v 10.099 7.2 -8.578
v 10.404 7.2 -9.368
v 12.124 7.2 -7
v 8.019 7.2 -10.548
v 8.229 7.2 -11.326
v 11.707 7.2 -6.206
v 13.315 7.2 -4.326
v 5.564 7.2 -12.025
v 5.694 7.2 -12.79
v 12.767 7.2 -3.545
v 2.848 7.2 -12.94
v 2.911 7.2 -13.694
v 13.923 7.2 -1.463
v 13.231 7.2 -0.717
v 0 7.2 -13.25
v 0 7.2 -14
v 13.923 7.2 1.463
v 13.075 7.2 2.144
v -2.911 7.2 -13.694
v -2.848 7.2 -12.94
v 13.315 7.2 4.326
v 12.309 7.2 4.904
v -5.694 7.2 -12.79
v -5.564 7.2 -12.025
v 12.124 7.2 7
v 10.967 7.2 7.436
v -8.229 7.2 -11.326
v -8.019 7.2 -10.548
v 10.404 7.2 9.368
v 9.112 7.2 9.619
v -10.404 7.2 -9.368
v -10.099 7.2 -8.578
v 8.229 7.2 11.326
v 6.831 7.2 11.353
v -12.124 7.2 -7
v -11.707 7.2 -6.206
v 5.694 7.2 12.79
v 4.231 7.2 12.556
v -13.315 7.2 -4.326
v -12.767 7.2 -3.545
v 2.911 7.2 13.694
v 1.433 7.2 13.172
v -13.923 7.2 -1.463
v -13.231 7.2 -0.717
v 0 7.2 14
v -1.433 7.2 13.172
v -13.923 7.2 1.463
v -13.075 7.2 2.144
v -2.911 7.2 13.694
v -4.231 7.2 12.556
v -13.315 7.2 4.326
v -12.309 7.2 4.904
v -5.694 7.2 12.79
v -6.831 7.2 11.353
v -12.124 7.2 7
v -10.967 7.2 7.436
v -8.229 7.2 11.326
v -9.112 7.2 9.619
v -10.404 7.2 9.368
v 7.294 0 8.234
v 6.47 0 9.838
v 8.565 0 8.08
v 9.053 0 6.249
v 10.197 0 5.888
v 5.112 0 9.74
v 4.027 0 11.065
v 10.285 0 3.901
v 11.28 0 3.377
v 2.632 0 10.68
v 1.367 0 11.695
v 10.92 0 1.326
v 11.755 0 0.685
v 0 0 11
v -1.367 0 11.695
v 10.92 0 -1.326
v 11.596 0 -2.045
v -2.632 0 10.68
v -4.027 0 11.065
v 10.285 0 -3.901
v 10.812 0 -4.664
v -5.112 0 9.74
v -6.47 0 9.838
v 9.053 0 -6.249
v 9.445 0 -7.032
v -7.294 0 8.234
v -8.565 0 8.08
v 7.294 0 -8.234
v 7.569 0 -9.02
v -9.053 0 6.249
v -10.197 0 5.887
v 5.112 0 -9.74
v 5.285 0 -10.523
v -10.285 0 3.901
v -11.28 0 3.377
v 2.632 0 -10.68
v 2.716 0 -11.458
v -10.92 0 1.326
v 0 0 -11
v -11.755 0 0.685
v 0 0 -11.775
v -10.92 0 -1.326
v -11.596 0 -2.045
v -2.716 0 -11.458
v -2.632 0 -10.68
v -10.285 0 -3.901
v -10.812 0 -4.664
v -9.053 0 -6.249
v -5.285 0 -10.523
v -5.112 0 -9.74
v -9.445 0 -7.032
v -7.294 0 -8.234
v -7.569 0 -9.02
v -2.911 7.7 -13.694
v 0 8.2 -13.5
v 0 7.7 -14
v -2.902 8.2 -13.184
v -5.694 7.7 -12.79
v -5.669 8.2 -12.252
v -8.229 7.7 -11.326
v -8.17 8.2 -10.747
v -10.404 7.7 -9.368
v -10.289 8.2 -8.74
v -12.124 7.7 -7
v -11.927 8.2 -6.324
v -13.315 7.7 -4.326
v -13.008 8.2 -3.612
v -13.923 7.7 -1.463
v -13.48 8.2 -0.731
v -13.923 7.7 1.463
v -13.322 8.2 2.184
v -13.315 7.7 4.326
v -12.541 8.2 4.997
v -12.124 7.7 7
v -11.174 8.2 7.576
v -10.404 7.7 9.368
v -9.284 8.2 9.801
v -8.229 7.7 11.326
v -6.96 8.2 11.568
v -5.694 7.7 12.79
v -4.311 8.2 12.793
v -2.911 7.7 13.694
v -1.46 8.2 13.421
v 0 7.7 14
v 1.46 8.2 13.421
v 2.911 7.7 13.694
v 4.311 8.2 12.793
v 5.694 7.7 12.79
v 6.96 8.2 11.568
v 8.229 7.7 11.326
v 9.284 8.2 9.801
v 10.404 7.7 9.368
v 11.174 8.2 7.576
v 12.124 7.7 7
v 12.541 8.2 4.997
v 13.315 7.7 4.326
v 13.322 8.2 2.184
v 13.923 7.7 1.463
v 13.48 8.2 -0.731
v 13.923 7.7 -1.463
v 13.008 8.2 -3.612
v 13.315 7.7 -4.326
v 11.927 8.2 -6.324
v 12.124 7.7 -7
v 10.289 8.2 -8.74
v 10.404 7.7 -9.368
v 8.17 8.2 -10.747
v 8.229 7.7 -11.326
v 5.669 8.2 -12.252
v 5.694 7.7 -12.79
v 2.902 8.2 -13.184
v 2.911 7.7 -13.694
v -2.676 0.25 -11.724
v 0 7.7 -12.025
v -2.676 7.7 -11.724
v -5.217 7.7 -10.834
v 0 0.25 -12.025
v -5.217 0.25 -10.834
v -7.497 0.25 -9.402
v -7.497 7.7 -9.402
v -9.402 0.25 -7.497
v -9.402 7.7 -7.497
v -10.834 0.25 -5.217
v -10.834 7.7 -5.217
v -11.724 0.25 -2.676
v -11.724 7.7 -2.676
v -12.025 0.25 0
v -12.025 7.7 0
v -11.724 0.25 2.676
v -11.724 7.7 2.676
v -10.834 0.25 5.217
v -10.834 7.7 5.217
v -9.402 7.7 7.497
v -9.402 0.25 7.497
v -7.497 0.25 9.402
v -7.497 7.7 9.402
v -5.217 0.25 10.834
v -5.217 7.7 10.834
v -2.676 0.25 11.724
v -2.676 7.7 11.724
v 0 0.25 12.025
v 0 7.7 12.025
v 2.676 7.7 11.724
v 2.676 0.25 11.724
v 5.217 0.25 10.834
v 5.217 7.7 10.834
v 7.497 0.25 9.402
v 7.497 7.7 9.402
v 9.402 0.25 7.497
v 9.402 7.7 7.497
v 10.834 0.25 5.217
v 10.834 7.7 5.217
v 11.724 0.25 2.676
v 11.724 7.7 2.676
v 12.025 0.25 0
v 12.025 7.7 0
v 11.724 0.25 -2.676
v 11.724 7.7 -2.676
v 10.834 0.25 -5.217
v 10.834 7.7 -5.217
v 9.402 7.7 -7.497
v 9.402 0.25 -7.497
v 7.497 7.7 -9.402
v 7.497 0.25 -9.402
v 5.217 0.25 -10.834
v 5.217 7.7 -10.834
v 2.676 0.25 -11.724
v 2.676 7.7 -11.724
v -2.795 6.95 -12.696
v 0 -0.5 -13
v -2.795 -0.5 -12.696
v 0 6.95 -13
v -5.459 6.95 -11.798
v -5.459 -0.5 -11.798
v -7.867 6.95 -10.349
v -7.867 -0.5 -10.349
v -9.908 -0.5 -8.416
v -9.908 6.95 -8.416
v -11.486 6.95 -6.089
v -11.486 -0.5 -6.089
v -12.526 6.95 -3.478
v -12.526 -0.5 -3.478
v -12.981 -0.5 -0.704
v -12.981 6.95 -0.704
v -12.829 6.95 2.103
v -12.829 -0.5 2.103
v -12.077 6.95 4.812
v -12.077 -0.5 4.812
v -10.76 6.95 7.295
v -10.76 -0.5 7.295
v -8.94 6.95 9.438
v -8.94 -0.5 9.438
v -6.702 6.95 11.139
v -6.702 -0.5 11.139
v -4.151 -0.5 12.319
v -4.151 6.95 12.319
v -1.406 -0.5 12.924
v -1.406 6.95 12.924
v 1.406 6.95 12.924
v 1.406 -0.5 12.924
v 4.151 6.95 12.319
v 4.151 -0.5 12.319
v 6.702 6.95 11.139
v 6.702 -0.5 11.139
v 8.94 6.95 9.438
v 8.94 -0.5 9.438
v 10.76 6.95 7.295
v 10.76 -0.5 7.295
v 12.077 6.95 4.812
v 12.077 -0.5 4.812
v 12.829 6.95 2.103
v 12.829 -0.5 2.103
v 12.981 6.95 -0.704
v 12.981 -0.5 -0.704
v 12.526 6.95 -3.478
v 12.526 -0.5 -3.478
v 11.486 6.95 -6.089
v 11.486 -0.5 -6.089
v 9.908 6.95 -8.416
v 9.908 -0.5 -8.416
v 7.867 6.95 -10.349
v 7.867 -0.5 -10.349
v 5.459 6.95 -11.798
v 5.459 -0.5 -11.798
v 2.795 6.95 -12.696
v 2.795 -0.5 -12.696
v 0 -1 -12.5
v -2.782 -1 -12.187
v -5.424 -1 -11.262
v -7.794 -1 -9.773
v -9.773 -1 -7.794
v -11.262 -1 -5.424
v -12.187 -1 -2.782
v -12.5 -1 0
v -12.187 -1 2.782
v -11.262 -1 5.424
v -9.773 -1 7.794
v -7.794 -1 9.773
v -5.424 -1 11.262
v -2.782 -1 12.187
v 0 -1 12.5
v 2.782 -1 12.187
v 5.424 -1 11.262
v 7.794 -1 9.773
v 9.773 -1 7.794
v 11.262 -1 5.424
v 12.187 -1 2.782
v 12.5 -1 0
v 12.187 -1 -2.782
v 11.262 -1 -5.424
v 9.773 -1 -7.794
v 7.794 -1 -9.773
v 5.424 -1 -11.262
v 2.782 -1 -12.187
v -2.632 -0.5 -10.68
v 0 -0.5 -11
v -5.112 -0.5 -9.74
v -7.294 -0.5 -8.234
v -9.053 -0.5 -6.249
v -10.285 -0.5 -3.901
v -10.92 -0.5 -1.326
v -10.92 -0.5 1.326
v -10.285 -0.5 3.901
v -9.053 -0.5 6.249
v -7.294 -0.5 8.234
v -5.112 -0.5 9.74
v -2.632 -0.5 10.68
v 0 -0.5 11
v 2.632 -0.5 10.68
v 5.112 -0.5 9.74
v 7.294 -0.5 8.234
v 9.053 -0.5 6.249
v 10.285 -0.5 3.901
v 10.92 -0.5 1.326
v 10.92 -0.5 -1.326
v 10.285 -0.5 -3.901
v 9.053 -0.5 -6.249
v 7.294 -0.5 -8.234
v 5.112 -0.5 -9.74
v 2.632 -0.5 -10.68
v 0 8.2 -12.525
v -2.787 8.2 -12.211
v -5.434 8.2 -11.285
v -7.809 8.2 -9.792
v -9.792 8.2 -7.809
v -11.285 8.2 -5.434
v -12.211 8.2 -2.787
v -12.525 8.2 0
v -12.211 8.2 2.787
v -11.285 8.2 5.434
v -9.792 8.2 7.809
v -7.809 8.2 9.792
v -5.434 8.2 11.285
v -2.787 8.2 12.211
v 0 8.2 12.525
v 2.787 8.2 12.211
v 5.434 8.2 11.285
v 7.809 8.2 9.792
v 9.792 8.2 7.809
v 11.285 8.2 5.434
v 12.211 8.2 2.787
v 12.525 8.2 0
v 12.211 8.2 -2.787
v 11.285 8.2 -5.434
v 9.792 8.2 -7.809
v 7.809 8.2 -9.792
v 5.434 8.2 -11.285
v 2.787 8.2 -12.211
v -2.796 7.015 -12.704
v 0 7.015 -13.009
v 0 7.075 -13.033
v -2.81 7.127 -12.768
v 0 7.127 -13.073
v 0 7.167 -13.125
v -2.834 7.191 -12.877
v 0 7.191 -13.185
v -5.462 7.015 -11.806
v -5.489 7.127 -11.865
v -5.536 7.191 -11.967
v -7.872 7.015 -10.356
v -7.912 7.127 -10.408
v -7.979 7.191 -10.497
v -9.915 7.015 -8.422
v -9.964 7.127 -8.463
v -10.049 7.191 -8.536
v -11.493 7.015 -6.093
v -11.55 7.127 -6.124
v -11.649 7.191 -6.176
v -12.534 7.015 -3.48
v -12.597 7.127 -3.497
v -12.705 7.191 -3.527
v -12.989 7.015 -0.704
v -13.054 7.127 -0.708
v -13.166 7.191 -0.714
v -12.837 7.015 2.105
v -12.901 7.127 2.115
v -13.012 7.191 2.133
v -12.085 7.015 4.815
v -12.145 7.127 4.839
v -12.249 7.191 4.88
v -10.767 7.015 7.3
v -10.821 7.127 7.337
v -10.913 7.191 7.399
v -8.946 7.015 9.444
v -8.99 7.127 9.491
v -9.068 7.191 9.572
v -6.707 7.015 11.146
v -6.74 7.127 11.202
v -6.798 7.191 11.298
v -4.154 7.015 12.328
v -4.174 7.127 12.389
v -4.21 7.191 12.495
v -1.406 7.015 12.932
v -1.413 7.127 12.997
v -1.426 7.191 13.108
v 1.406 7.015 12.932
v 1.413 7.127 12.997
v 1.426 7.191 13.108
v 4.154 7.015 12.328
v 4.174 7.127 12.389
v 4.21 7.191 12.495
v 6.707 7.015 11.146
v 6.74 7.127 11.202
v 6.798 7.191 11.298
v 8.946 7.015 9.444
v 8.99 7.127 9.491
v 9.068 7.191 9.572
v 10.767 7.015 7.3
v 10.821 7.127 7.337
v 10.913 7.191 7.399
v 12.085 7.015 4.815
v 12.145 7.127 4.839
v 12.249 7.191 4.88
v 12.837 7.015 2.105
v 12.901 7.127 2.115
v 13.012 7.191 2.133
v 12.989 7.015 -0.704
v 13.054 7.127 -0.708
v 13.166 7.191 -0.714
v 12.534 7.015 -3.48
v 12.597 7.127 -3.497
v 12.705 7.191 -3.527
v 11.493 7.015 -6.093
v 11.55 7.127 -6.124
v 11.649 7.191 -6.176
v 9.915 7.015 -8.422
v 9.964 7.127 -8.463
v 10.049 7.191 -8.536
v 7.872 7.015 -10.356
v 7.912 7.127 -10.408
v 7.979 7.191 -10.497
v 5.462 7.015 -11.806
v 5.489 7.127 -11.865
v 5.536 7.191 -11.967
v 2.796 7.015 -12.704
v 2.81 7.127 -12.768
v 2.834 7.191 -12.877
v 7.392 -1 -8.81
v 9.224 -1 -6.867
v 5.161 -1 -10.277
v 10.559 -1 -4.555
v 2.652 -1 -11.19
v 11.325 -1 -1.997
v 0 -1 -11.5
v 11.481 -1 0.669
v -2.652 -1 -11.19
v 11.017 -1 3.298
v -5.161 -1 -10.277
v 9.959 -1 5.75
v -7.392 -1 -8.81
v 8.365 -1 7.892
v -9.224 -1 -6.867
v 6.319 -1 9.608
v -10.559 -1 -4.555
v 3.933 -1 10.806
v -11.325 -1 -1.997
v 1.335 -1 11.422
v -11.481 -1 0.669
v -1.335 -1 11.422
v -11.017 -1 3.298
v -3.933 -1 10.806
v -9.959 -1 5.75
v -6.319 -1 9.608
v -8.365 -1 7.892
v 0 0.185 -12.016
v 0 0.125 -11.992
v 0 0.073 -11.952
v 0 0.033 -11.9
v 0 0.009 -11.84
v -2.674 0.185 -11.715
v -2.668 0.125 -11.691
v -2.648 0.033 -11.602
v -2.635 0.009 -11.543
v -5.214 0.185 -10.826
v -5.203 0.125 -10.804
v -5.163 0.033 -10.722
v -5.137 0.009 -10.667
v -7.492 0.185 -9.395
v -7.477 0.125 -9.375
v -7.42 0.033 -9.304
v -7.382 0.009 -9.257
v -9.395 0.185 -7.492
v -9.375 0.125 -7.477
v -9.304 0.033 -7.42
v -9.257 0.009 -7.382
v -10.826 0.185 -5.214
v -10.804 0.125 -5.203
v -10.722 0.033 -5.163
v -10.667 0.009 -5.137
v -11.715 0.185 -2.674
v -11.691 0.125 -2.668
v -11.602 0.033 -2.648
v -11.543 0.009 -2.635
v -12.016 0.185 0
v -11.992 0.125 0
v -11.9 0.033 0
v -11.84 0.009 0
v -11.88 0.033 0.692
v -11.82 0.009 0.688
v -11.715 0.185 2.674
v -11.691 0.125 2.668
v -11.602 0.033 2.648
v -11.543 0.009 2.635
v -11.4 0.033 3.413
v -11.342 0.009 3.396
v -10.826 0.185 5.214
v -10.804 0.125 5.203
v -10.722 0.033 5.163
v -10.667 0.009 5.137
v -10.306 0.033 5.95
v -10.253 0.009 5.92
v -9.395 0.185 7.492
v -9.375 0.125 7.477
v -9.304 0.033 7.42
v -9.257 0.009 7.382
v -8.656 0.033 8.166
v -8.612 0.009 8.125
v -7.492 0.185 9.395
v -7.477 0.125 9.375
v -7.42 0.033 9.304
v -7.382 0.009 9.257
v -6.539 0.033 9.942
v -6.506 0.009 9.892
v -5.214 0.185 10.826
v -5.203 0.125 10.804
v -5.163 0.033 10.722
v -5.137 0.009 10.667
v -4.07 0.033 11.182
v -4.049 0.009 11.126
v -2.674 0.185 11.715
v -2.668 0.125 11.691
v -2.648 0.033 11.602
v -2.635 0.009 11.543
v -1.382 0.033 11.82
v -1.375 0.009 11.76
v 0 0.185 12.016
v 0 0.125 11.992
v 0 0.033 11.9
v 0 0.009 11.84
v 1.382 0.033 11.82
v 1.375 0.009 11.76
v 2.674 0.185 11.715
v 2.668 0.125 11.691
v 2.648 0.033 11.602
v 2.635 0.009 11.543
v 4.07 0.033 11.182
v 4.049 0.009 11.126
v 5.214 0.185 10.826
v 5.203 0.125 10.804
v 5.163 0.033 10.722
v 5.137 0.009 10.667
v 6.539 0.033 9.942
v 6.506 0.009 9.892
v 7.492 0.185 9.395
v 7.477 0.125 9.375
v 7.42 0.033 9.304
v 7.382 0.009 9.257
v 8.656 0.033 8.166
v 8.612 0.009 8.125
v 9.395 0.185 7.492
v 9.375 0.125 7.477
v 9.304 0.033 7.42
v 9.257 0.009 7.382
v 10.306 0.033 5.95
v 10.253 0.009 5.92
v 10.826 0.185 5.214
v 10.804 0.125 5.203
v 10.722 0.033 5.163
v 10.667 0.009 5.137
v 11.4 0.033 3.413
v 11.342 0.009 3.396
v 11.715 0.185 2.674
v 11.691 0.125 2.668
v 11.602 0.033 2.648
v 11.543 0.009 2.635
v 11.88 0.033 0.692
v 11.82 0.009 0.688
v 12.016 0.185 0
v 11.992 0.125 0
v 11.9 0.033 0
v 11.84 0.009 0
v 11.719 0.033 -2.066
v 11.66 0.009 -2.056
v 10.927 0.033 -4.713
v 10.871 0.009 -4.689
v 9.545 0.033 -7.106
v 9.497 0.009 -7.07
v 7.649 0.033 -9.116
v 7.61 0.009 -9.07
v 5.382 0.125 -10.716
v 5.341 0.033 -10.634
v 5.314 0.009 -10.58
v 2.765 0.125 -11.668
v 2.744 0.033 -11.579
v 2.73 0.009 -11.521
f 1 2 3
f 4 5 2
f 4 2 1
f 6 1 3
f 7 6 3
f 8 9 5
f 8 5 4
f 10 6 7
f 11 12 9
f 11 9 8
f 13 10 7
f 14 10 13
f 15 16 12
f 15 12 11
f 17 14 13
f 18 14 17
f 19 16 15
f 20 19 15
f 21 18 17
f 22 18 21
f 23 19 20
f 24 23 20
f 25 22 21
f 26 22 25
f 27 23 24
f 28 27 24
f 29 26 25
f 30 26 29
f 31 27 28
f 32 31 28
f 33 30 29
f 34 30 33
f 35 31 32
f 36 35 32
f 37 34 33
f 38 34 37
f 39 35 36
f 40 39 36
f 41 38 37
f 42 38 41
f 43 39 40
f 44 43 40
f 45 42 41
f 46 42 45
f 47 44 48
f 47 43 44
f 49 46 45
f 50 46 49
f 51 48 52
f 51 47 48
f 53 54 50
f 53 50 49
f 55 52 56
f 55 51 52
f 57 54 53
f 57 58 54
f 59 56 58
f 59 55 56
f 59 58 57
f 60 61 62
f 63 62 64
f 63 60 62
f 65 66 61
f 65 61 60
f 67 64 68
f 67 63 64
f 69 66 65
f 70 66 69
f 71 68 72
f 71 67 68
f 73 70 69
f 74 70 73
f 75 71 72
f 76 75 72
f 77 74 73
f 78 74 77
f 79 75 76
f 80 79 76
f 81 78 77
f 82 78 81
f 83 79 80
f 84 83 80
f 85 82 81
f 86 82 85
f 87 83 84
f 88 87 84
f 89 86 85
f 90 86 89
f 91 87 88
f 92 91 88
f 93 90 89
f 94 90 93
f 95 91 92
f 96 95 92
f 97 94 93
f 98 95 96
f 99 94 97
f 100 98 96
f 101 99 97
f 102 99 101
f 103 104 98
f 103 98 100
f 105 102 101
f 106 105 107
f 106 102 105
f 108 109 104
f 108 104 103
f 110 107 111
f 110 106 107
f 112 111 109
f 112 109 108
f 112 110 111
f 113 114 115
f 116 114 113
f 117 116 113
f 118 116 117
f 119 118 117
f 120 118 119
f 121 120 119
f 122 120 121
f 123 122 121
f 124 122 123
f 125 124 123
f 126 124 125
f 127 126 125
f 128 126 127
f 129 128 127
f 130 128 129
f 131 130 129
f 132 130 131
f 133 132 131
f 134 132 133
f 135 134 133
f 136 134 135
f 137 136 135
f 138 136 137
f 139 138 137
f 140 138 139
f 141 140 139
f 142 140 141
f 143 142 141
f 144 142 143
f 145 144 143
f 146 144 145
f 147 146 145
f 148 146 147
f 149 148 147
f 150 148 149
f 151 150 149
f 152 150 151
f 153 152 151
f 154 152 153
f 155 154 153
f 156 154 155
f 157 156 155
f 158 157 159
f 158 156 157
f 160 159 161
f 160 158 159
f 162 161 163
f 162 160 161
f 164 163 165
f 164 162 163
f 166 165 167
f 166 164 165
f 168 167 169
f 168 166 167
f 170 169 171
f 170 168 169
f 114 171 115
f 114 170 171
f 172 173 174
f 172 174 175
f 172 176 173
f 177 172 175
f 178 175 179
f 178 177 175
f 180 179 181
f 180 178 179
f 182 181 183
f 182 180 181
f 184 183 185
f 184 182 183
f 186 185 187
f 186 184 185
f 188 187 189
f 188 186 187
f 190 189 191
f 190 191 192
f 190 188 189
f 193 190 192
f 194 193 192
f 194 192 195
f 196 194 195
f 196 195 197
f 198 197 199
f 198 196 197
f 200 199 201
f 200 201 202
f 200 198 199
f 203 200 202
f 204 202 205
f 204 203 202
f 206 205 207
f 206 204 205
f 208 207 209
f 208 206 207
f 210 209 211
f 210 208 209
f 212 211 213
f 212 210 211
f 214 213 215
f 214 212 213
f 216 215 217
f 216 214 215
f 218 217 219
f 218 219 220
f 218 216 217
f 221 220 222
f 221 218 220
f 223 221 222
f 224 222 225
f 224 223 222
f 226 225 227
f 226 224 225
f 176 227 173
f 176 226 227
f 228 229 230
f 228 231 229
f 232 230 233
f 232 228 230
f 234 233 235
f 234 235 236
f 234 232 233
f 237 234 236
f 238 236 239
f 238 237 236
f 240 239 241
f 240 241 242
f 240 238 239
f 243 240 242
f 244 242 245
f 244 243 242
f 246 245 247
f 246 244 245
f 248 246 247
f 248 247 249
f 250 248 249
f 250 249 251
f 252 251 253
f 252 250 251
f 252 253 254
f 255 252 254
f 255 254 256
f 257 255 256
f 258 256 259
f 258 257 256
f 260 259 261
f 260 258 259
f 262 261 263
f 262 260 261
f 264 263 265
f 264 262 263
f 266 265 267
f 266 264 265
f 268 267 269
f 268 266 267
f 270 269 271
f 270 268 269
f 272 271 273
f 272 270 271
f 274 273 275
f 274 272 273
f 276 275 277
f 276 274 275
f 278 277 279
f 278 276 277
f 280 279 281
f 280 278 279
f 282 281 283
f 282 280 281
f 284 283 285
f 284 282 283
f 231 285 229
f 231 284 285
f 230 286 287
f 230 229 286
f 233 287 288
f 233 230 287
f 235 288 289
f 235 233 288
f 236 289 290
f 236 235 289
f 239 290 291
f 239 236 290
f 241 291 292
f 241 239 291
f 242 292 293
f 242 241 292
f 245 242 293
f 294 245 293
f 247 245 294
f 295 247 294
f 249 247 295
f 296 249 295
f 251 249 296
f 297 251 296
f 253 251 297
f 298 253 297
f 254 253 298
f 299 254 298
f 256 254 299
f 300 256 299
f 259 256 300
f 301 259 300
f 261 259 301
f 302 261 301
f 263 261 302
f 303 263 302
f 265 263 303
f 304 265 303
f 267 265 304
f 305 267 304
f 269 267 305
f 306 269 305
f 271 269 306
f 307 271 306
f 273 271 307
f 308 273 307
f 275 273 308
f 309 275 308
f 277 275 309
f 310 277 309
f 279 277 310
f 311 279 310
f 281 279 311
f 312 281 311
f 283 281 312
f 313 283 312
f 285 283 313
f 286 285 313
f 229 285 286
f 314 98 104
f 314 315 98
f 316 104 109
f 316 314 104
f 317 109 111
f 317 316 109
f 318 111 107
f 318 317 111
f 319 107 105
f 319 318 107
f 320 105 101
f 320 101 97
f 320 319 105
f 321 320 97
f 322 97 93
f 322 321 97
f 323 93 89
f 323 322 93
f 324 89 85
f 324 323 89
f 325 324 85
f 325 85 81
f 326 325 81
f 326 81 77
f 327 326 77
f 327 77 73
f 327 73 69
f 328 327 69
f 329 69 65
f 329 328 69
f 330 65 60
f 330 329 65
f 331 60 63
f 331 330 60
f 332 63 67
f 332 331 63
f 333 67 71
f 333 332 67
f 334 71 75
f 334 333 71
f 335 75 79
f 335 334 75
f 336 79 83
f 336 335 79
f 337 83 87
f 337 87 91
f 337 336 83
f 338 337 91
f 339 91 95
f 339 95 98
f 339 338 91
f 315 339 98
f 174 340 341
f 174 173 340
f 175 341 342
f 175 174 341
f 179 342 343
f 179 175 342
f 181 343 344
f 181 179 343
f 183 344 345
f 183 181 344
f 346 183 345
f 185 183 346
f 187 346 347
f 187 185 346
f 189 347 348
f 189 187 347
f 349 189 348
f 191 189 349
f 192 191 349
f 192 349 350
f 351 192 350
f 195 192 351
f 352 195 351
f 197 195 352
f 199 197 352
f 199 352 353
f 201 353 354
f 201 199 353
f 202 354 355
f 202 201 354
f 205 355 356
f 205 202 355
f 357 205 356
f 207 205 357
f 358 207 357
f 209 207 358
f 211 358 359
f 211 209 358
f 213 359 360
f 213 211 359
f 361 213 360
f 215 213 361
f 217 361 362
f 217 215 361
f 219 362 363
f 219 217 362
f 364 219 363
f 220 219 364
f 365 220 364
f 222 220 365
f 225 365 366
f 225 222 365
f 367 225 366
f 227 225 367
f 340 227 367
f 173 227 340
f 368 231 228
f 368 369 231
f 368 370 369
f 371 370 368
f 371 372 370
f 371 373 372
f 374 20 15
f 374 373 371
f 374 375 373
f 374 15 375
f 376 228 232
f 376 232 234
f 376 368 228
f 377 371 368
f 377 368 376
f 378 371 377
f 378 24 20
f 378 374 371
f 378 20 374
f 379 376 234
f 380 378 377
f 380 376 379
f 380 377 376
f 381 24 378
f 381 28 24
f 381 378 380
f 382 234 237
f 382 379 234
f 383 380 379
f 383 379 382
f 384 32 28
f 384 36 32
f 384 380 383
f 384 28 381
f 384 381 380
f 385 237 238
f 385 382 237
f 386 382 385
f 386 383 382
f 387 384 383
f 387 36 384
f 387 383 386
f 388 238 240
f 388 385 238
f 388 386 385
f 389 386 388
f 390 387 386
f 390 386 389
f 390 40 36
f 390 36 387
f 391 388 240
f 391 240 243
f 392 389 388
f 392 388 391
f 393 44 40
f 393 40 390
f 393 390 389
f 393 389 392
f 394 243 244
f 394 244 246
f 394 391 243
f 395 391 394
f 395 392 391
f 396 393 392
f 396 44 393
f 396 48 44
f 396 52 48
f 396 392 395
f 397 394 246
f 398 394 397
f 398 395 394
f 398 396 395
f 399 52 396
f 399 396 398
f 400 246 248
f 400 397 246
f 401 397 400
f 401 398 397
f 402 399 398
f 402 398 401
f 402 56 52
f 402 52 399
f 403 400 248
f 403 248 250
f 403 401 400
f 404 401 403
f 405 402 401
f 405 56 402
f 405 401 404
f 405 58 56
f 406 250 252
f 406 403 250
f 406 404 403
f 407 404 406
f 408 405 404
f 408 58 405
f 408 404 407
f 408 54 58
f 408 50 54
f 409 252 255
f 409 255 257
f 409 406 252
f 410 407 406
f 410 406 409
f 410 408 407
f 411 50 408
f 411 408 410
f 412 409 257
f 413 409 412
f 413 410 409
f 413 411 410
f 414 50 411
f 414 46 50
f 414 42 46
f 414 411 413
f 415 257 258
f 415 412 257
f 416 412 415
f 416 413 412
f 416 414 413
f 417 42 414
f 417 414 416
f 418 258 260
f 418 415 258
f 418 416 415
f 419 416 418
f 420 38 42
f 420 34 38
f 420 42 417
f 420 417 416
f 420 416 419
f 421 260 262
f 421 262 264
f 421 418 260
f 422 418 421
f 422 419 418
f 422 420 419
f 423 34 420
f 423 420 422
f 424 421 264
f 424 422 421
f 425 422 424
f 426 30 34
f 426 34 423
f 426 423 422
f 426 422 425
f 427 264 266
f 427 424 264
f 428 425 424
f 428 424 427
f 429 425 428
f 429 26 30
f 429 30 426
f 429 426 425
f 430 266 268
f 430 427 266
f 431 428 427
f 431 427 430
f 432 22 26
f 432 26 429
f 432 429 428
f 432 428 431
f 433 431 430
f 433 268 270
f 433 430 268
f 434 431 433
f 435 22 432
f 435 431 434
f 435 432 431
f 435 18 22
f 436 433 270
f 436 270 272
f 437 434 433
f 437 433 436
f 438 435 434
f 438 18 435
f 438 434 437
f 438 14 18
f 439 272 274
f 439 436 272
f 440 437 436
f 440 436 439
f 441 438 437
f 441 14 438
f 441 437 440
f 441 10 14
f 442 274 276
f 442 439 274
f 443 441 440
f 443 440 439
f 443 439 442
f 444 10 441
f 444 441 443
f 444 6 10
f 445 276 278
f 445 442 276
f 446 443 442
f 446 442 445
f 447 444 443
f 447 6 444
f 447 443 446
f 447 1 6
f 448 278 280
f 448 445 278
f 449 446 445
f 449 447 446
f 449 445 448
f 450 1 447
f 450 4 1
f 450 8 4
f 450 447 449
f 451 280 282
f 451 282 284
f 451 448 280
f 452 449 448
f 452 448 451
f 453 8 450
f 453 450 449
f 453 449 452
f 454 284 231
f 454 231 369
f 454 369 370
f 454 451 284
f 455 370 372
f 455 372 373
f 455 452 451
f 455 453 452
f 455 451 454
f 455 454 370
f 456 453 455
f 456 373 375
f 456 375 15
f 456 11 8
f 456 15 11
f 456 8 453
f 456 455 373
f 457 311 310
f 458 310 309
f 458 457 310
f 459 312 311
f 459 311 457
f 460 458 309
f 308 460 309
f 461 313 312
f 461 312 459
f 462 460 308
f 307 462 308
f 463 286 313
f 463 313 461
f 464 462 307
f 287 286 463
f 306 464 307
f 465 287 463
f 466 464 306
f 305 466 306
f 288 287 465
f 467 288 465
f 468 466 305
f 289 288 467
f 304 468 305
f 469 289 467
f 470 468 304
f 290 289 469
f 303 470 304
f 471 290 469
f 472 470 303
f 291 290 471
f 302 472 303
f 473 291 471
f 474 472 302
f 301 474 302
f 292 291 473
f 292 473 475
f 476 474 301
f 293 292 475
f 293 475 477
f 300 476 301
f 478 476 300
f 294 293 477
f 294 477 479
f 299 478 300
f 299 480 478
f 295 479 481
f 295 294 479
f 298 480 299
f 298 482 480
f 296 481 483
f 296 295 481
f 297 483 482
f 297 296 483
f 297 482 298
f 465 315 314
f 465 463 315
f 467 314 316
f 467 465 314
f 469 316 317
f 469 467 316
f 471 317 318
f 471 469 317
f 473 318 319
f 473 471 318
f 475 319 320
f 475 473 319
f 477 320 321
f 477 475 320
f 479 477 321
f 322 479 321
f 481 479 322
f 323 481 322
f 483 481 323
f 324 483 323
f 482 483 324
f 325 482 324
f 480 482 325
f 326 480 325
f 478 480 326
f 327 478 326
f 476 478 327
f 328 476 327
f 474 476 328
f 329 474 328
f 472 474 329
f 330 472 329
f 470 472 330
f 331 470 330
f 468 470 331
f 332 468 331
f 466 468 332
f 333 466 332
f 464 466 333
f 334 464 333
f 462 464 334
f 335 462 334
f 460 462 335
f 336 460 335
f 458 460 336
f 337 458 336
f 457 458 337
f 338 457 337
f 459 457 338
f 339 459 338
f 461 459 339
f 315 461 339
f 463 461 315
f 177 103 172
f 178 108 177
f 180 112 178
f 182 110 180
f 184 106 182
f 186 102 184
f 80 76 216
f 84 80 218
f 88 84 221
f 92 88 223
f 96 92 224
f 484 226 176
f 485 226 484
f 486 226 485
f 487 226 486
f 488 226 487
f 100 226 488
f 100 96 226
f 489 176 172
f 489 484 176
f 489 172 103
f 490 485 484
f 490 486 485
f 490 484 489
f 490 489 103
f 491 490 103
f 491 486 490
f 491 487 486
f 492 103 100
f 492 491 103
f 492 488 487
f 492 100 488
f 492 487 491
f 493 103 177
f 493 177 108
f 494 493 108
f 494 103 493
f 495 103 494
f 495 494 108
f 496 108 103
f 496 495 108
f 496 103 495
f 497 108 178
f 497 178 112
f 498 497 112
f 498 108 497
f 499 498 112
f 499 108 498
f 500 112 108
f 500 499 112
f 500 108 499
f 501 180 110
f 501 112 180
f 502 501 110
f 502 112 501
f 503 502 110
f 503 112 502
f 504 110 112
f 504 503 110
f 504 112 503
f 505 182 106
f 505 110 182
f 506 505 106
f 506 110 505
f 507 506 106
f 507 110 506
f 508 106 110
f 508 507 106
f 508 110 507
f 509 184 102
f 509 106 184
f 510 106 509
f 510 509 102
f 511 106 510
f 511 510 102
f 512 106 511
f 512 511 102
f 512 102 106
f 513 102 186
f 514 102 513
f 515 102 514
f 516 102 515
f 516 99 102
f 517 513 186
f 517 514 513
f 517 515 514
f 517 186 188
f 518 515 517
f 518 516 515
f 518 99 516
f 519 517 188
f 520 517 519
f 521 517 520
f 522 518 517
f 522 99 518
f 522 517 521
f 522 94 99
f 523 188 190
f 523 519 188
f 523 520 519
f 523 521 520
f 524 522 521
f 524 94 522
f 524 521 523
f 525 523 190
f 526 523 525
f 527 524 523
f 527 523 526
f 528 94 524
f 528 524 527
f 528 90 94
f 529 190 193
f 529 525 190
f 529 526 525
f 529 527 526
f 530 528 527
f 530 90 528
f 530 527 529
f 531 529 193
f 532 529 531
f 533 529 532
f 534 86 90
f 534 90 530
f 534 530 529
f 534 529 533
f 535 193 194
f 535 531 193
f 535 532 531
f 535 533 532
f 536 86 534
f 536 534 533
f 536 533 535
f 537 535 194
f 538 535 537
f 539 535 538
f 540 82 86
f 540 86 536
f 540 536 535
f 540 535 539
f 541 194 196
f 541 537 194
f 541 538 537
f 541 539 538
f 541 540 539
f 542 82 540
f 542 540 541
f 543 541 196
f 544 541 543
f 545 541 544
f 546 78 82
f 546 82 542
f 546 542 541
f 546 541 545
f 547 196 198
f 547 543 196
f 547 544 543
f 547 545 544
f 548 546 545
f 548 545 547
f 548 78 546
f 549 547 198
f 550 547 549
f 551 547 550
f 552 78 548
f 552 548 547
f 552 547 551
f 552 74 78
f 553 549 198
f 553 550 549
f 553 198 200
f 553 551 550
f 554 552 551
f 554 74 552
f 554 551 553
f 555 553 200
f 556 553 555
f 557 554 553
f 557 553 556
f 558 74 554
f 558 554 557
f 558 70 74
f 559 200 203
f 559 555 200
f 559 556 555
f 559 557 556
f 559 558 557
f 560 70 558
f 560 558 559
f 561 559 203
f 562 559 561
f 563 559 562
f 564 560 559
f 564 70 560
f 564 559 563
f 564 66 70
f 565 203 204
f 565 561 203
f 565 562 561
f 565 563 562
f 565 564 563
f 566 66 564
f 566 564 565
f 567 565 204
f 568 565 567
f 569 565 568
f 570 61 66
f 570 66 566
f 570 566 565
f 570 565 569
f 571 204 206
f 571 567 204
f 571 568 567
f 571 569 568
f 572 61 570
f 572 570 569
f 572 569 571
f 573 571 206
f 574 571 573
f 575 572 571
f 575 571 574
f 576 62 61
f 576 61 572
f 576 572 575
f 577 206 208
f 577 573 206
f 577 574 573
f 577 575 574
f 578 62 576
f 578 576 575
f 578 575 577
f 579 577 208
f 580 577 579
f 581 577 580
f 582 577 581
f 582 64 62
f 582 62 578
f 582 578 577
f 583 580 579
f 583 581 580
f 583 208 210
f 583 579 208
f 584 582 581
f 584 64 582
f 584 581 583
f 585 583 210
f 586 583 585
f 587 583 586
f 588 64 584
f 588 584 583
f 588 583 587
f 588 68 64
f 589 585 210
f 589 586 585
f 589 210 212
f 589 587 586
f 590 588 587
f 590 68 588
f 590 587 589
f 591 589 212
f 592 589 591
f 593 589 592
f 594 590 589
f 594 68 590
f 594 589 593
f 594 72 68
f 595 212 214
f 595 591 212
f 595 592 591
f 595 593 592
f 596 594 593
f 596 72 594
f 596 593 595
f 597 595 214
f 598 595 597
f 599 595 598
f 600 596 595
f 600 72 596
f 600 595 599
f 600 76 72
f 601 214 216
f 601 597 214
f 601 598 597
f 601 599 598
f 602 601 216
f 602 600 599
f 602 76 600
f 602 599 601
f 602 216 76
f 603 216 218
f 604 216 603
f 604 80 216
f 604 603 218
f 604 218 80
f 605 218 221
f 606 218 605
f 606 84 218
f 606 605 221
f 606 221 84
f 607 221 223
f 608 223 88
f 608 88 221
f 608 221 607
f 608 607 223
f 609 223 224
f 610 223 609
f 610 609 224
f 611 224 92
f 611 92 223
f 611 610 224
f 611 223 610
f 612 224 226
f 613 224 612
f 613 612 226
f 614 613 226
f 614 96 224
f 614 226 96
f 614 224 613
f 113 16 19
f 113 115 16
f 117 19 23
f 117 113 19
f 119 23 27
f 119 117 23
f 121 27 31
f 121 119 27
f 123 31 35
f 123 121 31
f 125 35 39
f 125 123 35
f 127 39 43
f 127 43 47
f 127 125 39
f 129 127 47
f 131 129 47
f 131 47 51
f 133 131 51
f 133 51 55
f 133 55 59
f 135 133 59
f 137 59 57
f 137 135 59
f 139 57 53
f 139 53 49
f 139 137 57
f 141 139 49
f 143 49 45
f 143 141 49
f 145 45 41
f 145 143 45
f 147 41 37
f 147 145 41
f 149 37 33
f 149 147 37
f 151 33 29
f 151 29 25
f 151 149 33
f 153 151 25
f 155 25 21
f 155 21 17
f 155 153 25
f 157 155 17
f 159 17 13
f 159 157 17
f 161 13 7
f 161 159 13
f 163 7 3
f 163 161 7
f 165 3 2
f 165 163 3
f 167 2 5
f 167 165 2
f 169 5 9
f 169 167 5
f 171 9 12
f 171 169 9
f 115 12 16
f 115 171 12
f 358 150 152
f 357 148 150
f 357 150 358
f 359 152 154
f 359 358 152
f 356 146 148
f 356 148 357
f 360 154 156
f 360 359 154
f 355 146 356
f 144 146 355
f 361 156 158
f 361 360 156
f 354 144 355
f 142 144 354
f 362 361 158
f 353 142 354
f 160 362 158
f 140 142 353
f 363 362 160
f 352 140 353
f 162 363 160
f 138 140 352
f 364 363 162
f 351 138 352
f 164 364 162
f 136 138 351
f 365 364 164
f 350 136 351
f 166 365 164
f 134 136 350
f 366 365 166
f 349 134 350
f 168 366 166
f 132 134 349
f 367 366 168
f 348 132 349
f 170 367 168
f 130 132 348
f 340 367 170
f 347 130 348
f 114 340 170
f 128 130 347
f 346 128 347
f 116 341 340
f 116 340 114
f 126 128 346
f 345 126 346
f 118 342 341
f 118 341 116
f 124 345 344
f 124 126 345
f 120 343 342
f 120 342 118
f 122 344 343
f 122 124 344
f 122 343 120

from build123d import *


with BuildPart() as part:
    # Sketch1 → Revolve1 (revolve)
    with BuildSketch(Plane(origin=(0, 0, 0), x_dir=(0, 0, -1), z_dir=(1, 0, 0))):
        with BuildLine():
            Line((11, 0), (11, -0.5))
            Line((11, -0.5), (11.5, -1))
            Line((11.5, -1), (12.5, -1))
            Line((12.5, -1), (13, -0.5))
            Line((13, -0.5), (13, 6.95))
            ThreePointArc((13, 6.95), (13.073223305, 7.126776695), (13.25, 7.2))
            Line((13.25, 7.2), (14, 7.2))
            Line((14, 7.2), (14, 7.7))
            Line((14, 7.7), (13.5, 8.2))
            Line((13.5, 8.2), (12.525, 8.2))
            Line((12.525, 8.2), (12.025, 7.7))
            Line((12.025, 7.7), (12.025, 0.25))
            ThreePointArc((12.025, 0.25), (11.951776695, 0.073223305), (11.775, 0))
            Line((11.775, 0), (11, 0))
        make_face()
    revolve(axis=Axis((0, 0, 0), (0, 1, 0)))


solid = part.part
